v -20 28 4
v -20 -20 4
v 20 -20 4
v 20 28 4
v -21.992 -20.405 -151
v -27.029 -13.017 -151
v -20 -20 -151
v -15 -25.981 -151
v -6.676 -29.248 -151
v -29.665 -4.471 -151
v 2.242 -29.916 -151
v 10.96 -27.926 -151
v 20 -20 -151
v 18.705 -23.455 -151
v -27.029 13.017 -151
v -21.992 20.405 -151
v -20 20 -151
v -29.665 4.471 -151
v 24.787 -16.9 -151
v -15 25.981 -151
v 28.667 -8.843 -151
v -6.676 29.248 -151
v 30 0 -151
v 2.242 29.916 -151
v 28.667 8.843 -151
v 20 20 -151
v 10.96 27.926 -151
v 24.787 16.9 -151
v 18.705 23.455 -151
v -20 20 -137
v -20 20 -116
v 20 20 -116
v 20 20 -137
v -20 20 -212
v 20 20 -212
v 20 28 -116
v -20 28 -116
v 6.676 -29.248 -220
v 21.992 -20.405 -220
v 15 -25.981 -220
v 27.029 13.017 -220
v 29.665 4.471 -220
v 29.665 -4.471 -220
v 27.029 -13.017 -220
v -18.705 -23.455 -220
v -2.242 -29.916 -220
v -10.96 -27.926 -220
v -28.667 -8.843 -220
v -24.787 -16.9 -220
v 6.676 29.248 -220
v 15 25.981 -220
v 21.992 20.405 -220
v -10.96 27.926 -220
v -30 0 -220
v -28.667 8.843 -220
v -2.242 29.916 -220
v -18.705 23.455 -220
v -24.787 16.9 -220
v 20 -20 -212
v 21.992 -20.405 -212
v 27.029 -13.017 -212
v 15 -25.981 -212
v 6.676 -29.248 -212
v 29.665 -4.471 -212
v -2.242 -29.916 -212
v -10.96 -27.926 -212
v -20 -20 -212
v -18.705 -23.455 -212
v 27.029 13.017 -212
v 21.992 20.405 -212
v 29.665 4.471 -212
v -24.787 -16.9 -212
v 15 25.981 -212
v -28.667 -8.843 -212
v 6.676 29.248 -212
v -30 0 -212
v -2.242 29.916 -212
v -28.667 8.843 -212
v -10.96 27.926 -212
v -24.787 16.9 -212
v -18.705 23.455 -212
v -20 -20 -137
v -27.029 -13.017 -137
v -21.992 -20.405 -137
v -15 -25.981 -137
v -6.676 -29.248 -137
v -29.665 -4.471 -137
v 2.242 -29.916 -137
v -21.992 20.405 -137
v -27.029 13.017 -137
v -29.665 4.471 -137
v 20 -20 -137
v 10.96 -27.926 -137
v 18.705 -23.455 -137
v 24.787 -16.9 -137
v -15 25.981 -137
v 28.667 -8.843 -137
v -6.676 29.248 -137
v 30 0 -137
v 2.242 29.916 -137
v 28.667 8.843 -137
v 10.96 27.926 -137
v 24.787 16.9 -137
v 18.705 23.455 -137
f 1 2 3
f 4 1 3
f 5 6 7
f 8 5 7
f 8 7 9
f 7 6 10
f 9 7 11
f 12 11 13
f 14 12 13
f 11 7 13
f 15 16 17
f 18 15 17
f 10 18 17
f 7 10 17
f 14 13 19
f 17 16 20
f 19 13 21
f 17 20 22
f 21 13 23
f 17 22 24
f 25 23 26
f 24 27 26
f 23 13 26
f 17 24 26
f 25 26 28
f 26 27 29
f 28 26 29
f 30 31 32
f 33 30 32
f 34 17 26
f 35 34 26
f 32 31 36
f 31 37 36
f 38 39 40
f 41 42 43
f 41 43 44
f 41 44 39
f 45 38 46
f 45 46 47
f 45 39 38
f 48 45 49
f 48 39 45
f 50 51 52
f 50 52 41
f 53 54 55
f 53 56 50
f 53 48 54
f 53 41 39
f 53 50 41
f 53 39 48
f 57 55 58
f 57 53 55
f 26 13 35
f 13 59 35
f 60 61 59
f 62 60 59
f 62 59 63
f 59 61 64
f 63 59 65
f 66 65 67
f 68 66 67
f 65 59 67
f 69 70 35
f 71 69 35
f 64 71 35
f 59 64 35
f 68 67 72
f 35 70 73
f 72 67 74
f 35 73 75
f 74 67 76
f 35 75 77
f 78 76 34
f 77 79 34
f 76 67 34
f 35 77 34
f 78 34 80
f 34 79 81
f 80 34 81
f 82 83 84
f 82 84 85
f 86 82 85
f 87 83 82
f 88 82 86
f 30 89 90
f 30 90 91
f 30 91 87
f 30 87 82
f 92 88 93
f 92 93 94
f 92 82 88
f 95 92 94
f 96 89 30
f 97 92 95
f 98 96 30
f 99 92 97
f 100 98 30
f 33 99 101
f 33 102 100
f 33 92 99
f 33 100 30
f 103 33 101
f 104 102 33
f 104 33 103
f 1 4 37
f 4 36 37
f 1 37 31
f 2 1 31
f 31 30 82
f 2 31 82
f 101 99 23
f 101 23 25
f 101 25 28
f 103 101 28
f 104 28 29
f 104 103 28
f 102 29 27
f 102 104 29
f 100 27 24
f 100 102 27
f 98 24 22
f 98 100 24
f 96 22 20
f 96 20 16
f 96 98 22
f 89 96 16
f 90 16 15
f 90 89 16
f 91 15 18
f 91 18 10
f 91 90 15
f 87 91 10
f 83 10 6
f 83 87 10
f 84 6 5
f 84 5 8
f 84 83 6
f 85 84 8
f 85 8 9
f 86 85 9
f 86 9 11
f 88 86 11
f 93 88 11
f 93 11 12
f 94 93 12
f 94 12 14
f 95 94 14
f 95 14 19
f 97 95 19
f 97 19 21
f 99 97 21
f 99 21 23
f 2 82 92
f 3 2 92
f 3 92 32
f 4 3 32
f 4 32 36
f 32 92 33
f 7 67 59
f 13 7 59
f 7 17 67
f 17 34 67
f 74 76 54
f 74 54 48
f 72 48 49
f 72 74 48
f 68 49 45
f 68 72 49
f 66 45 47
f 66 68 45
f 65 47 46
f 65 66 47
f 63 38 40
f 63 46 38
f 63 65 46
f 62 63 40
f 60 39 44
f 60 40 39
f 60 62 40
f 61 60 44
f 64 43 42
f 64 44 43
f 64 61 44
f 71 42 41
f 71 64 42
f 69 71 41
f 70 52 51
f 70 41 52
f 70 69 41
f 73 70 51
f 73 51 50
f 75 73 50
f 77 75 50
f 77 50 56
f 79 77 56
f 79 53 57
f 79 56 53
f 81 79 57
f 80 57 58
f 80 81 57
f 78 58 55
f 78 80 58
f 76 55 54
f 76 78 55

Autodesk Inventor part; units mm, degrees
ref_plane "XZ Plane" through (0, 0, 0) normal (0, 1, 0) x (-1, 0, 0)
sketch "Sketch1" plane through (0, 0, 0) normal (0, 0, 1) x (1, 0, 0)
  line L0 (-20, -20) -> (20, -20)
  line L1 (20, -20) -> (20, 28)
  line L2 (20, 28) -> (-20, 28)
  line L3 (-20, 28) -> (-20, -20)
  line L4 (-20, -20) -> (20, 28) construction
  line L5 (20, -20) -> (-20, 28) construction
  line L6 (0, -29.6) -> (0, 37.6) projected
  point P0 (0, 0)
  point P1 (0, 4)
  dimension "d0" = 20
  dimension "d1" = 28
  dimension "d2" = 40
extrude "Extrusion1" add sketch "Sketch1" along normal blind 4 and the other way blind 116
sketch "Sketch3" plane through (0, 0, -116) normal (0, 0, -1) x (-1, 0, 0)
  line L0 (-20, -20) -> (20, -20)
  line L1 (20, -20) -> (20, 20)
  line L2 (20, 20) -> (-20, 20)
  line L3 (-20, 20) -> (-20, -20)
  line L4 (-20, -20) -> (20, 20) construction
  line L5 (20, -20) -> (-20, 20) construction
  line L6 (0, -29.6) -> (0, 37.6) projected
  line L7 (-20, -20) -> (20, -20) projected
  line L8 (20, -20) -> (20, 28) projected
  line L9 (20, 28) -> (-20, 28) projected
  point P0 (0, 0)
  point P1 (0, 0)
  point P2 (0, 0)
  dimension "d16" = 8
extrude "Extrusion3" add sketch "Sketch3" along normal blind 96 contours L3 L2 L6 L0 | L6 L2 L1 L0
ref_plane "Work Plane1" through (0, 0, -144) normal (0, 0, 1) x (1, 0, 0)
sketch "Sketch4" plane through (0, 0, -144) normal (0, 0, 1) x (1, 0, 0)
  circle A0 centre (0, 0) radius 30
  dimension "d20" = 60
extrude "Extrusion4" add sketch "Sketch4" along normal mid plane 14
sketch "Sketch5" plane through (0, 0, -212) normal (0, 0, -1) x (-1, 0, 0)
  circle A0 centre (0, 0) radius 30
  dimension "d23" = 60
extrude "Extrusion5" add sketch "Sketch5" along normal blind 8
ref_plane "UCS4: YZ Plane" through (0, 0, 0) normal (1, 0, 0) x (0, 1, 0)
ref_plane "UCS4: XZ Plane" through (0, 0, 0) normal (0, 1, 0) x (0, 0, 1)
ref_plane "UCS4: XY Plane" through (0, 0, 0) normal (0, 0, 1) x (1, 0, 0)
properties part number "link_4"
